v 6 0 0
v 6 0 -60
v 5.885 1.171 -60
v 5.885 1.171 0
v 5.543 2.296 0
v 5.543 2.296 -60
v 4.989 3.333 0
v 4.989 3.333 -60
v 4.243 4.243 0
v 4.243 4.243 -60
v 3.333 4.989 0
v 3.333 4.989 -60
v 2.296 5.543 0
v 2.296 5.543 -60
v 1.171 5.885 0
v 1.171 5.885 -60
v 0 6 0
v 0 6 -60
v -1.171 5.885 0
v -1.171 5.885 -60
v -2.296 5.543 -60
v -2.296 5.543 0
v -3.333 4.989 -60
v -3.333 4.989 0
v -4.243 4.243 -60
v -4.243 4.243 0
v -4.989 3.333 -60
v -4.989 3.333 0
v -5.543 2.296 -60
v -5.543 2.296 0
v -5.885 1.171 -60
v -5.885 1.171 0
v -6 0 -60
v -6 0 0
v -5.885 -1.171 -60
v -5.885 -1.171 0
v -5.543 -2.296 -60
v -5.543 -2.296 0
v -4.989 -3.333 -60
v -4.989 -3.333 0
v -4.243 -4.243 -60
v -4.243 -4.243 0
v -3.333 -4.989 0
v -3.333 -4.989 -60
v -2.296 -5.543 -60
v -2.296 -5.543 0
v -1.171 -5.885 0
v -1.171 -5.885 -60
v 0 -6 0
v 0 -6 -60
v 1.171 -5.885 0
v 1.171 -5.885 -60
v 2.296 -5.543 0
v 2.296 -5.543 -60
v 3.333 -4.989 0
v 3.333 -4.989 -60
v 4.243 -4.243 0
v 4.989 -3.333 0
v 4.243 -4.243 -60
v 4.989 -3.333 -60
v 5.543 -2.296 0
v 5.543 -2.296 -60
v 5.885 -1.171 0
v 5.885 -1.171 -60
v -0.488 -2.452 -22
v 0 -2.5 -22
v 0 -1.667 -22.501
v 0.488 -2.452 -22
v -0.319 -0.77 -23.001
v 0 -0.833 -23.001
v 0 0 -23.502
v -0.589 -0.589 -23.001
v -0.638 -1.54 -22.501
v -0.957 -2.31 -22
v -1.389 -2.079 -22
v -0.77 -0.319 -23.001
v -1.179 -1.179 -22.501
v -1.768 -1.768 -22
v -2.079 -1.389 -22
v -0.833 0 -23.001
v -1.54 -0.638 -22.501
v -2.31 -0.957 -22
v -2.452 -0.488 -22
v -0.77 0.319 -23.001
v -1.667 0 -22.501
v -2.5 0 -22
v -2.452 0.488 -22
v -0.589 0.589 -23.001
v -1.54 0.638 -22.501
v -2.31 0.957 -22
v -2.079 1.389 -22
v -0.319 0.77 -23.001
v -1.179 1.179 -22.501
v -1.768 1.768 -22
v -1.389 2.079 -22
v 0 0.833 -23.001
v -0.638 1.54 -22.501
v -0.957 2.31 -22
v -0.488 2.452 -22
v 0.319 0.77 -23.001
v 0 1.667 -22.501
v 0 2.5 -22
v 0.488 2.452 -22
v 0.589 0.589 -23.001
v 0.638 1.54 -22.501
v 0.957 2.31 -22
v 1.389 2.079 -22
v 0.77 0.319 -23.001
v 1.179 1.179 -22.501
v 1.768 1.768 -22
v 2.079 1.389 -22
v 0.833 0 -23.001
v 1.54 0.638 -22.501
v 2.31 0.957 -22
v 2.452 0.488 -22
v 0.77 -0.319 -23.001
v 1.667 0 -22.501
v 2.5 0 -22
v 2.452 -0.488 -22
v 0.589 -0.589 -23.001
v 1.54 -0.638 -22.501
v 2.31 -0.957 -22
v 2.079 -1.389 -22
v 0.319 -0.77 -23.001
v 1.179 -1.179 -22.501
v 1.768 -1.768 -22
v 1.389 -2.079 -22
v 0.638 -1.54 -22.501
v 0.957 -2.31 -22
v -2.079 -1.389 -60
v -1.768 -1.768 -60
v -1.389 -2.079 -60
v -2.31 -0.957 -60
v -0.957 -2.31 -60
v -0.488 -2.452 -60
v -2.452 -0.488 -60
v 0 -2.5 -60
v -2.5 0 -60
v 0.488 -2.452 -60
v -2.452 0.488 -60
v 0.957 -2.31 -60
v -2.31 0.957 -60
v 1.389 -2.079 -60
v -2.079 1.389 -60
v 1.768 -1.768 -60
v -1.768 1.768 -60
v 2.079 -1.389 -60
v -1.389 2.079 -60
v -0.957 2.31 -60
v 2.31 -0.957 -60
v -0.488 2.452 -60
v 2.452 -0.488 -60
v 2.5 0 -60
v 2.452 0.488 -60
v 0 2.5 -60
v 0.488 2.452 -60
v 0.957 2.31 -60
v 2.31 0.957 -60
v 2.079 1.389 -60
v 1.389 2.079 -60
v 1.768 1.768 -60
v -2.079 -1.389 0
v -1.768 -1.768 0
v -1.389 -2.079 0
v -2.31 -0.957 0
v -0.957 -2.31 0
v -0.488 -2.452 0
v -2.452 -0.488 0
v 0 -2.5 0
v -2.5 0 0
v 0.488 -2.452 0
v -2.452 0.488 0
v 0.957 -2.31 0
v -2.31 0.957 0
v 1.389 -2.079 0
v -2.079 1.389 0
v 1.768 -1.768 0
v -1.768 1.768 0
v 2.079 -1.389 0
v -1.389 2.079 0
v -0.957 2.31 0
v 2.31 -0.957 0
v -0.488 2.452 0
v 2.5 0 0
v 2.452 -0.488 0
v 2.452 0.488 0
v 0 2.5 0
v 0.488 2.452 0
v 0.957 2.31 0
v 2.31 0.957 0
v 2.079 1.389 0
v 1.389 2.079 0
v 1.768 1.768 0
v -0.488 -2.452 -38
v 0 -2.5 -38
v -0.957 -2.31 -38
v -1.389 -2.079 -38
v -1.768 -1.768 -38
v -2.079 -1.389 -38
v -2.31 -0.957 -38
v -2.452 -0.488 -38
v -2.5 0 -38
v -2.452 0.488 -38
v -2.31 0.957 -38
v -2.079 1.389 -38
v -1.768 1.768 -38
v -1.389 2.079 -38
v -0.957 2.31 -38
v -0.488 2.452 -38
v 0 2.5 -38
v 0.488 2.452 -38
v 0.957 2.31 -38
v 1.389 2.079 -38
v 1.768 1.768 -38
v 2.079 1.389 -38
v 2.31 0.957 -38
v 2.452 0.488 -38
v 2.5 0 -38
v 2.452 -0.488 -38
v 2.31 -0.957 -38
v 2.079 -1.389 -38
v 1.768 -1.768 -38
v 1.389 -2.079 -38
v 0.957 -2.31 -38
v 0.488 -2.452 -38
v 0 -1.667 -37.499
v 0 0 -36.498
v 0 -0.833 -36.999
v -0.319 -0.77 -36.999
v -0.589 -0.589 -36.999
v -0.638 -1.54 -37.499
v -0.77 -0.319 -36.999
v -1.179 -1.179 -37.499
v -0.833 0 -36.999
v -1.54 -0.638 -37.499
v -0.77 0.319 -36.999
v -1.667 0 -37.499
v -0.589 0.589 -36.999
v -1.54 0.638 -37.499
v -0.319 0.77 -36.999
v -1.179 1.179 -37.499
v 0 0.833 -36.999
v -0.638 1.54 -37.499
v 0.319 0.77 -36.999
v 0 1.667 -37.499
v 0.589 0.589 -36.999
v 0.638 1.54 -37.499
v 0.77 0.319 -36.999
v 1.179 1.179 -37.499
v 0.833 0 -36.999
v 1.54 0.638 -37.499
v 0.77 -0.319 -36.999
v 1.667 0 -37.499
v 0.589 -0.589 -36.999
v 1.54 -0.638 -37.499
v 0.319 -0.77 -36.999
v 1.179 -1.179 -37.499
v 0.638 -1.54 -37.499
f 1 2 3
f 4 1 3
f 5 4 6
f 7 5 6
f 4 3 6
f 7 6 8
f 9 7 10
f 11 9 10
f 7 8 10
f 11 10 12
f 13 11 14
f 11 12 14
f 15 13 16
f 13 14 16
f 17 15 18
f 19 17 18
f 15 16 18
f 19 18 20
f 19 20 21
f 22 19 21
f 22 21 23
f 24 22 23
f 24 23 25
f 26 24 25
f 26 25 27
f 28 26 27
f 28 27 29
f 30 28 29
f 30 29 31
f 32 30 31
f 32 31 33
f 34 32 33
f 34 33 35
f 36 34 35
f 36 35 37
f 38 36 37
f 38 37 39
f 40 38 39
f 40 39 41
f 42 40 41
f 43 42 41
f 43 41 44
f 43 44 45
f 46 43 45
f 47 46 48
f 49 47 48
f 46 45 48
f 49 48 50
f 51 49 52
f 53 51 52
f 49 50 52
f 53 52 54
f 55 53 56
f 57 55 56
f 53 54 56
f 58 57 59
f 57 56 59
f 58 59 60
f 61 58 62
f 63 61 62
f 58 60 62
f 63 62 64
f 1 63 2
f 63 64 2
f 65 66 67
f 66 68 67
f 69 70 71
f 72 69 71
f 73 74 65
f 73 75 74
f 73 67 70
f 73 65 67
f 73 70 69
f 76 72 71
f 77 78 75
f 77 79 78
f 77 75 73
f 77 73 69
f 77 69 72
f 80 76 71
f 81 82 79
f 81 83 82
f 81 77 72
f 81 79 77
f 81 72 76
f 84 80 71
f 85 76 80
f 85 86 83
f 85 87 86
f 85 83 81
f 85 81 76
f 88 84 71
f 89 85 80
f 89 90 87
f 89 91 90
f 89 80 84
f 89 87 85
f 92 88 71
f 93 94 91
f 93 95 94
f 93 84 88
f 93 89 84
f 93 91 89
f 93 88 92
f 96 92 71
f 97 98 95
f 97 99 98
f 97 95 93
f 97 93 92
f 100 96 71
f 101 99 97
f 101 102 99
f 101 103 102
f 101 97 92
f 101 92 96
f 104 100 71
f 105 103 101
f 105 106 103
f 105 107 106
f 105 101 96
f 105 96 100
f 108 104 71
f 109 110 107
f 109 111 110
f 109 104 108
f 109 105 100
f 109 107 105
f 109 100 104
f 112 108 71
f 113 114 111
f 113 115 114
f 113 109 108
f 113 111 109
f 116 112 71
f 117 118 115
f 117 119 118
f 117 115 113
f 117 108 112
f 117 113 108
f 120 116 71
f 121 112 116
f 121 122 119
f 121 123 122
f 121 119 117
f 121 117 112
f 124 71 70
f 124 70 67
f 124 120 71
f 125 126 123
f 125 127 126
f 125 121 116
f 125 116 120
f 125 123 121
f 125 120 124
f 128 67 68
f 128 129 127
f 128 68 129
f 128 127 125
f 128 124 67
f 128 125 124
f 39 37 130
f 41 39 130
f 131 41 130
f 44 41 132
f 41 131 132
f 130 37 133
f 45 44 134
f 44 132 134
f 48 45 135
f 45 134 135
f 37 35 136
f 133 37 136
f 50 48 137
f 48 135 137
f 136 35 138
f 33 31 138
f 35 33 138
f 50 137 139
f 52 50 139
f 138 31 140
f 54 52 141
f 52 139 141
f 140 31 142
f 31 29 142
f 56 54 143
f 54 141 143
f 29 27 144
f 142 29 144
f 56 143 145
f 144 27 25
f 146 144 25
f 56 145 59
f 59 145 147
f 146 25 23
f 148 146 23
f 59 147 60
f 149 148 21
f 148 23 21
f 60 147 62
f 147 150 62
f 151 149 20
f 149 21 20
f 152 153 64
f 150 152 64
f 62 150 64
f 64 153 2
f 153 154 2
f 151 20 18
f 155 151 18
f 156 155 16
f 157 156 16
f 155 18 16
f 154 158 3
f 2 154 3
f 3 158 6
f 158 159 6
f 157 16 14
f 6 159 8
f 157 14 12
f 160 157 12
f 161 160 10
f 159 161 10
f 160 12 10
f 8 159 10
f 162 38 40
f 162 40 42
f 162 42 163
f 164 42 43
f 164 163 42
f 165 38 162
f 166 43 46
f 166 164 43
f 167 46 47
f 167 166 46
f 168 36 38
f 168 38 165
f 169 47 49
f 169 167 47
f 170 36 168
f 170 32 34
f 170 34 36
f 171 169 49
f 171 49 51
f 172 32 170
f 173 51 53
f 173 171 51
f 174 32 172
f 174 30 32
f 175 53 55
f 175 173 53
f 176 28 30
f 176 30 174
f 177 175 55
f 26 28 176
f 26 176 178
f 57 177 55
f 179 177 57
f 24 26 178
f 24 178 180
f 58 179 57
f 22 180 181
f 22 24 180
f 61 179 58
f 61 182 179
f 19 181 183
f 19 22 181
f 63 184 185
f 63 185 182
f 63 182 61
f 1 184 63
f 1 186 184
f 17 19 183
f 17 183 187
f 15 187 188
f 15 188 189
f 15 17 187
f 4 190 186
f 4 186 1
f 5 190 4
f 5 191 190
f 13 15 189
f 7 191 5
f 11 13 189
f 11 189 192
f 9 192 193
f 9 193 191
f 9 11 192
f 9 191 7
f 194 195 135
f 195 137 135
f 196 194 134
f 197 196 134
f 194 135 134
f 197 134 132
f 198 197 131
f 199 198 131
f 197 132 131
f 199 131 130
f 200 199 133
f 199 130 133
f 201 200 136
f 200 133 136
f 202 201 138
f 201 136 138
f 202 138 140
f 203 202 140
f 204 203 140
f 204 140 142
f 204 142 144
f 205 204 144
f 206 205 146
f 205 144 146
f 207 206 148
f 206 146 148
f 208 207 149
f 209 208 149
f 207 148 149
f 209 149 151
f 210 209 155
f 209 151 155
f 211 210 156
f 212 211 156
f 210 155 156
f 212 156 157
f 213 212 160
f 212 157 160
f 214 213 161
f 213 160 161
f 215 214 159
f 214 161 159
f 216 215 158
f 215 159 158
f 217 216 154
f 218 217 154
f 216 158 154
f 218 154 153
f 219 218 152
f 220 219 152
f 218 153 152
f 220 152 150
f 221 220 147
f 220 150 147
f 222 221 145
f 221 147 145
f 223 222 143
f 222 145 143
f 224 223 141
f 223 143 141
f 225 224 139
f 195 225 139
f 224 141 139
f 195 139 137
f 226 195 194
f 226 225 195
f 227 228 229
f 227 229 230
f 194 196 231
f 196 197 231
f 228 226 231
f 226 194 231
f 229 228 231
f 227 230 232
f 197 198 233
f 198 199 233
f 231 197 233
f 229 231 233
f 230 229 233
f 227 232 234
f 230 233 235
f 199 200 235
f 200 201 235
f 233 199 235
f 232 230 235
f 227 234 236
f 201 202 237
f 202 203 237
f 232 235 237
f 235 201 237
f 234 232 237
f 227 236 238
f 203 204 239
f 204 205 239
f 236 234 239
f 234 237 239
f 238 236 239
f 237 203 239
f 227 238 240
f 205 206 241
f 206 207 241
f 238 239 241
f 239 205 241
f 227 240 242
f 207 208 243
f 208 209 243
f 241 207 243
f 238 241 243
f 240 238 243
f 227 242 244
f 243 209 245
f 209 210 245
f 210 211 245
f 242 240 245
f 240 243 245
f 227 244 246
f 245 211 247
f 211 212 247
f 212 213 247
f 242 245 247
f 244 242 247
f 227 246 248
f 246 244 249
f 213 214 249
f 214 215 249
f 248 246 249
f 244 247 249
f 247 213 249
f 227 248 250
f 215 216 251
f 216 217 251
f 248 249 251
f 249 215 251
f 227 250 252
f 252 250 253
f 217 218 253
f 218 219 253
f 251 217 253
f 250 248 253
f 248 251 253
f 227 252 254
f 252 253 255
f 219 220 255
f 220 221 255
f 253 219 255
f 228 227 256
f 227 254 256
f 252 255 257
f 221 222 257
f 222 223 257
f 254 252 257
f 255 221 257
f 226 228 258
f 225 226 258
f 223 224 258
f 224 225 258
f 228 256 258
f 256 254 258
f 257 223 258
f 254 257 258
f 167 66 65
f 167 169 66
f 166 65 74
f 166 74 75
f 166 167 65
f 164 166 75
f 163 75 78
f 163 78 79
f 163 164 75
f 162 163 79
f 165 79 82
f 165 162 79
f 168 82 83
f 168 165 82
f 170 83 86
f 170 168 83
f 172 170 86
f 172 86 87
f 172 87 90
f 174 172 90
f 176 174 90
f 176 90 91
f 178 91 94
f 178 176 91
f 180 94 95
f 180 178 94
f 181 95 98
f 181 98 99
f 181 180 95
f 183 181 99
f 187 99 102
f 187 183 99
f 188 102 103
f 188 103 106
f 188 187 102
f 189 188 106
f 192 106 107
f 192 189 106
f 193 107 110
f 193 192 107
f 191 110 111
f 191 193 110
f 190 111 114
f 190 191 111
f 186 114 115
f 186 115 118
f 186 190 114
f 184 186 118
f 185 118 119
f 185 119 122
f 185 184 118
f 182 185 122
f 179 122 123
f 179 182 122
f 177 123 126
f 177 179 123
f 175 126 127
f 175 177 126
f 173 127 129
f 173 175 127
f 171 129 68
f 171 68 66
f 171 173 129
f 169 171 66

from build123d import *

# Parameters (mm, degrees)
SKETCH1_R           = 6
BOSS_EXTRUDE1_DEPTH = 30


with BuildPart() as part:
    # Sketch1 → Boss-Extrude1 (new body)
    with BuildSketch(Plane.XY):
        Circle(SKETCH1_R)
    boss_extrude1 = extrude(amount=-BOSS_EXTRUDE1_DEPTH)

    # Sketch5 → Tap Drill for M6x1.0 Tap1 (revolve, cut)
    with BuildSketch(Plane(origin=(0, 0, 0), x_dir=(0, -1, 0), z_dir=(1, 0, 0))):
        Polygon((0, 0), (0, 23.502151548), (2.5, 22), (2.5, 0), align=None)
    tap_drill_for_m6x1_0_tap1 = revolve(axis=Axis((0, 0, 6.35), (0, 0, -1)), mode=Mode.SUBTRACT)

    # Mirror1: Boss-Extrude1, Tap Drill for M6x1.0 Tap1 across plane
    add(boss_extrude1.mirror(Plane.XY.offset(-30)))
    add(tap_drill_for_m6x1_0_tap1.mirror(Plane.XY.offset(-30)), mode=Mode.SUBTRACT)


solid = part.part
